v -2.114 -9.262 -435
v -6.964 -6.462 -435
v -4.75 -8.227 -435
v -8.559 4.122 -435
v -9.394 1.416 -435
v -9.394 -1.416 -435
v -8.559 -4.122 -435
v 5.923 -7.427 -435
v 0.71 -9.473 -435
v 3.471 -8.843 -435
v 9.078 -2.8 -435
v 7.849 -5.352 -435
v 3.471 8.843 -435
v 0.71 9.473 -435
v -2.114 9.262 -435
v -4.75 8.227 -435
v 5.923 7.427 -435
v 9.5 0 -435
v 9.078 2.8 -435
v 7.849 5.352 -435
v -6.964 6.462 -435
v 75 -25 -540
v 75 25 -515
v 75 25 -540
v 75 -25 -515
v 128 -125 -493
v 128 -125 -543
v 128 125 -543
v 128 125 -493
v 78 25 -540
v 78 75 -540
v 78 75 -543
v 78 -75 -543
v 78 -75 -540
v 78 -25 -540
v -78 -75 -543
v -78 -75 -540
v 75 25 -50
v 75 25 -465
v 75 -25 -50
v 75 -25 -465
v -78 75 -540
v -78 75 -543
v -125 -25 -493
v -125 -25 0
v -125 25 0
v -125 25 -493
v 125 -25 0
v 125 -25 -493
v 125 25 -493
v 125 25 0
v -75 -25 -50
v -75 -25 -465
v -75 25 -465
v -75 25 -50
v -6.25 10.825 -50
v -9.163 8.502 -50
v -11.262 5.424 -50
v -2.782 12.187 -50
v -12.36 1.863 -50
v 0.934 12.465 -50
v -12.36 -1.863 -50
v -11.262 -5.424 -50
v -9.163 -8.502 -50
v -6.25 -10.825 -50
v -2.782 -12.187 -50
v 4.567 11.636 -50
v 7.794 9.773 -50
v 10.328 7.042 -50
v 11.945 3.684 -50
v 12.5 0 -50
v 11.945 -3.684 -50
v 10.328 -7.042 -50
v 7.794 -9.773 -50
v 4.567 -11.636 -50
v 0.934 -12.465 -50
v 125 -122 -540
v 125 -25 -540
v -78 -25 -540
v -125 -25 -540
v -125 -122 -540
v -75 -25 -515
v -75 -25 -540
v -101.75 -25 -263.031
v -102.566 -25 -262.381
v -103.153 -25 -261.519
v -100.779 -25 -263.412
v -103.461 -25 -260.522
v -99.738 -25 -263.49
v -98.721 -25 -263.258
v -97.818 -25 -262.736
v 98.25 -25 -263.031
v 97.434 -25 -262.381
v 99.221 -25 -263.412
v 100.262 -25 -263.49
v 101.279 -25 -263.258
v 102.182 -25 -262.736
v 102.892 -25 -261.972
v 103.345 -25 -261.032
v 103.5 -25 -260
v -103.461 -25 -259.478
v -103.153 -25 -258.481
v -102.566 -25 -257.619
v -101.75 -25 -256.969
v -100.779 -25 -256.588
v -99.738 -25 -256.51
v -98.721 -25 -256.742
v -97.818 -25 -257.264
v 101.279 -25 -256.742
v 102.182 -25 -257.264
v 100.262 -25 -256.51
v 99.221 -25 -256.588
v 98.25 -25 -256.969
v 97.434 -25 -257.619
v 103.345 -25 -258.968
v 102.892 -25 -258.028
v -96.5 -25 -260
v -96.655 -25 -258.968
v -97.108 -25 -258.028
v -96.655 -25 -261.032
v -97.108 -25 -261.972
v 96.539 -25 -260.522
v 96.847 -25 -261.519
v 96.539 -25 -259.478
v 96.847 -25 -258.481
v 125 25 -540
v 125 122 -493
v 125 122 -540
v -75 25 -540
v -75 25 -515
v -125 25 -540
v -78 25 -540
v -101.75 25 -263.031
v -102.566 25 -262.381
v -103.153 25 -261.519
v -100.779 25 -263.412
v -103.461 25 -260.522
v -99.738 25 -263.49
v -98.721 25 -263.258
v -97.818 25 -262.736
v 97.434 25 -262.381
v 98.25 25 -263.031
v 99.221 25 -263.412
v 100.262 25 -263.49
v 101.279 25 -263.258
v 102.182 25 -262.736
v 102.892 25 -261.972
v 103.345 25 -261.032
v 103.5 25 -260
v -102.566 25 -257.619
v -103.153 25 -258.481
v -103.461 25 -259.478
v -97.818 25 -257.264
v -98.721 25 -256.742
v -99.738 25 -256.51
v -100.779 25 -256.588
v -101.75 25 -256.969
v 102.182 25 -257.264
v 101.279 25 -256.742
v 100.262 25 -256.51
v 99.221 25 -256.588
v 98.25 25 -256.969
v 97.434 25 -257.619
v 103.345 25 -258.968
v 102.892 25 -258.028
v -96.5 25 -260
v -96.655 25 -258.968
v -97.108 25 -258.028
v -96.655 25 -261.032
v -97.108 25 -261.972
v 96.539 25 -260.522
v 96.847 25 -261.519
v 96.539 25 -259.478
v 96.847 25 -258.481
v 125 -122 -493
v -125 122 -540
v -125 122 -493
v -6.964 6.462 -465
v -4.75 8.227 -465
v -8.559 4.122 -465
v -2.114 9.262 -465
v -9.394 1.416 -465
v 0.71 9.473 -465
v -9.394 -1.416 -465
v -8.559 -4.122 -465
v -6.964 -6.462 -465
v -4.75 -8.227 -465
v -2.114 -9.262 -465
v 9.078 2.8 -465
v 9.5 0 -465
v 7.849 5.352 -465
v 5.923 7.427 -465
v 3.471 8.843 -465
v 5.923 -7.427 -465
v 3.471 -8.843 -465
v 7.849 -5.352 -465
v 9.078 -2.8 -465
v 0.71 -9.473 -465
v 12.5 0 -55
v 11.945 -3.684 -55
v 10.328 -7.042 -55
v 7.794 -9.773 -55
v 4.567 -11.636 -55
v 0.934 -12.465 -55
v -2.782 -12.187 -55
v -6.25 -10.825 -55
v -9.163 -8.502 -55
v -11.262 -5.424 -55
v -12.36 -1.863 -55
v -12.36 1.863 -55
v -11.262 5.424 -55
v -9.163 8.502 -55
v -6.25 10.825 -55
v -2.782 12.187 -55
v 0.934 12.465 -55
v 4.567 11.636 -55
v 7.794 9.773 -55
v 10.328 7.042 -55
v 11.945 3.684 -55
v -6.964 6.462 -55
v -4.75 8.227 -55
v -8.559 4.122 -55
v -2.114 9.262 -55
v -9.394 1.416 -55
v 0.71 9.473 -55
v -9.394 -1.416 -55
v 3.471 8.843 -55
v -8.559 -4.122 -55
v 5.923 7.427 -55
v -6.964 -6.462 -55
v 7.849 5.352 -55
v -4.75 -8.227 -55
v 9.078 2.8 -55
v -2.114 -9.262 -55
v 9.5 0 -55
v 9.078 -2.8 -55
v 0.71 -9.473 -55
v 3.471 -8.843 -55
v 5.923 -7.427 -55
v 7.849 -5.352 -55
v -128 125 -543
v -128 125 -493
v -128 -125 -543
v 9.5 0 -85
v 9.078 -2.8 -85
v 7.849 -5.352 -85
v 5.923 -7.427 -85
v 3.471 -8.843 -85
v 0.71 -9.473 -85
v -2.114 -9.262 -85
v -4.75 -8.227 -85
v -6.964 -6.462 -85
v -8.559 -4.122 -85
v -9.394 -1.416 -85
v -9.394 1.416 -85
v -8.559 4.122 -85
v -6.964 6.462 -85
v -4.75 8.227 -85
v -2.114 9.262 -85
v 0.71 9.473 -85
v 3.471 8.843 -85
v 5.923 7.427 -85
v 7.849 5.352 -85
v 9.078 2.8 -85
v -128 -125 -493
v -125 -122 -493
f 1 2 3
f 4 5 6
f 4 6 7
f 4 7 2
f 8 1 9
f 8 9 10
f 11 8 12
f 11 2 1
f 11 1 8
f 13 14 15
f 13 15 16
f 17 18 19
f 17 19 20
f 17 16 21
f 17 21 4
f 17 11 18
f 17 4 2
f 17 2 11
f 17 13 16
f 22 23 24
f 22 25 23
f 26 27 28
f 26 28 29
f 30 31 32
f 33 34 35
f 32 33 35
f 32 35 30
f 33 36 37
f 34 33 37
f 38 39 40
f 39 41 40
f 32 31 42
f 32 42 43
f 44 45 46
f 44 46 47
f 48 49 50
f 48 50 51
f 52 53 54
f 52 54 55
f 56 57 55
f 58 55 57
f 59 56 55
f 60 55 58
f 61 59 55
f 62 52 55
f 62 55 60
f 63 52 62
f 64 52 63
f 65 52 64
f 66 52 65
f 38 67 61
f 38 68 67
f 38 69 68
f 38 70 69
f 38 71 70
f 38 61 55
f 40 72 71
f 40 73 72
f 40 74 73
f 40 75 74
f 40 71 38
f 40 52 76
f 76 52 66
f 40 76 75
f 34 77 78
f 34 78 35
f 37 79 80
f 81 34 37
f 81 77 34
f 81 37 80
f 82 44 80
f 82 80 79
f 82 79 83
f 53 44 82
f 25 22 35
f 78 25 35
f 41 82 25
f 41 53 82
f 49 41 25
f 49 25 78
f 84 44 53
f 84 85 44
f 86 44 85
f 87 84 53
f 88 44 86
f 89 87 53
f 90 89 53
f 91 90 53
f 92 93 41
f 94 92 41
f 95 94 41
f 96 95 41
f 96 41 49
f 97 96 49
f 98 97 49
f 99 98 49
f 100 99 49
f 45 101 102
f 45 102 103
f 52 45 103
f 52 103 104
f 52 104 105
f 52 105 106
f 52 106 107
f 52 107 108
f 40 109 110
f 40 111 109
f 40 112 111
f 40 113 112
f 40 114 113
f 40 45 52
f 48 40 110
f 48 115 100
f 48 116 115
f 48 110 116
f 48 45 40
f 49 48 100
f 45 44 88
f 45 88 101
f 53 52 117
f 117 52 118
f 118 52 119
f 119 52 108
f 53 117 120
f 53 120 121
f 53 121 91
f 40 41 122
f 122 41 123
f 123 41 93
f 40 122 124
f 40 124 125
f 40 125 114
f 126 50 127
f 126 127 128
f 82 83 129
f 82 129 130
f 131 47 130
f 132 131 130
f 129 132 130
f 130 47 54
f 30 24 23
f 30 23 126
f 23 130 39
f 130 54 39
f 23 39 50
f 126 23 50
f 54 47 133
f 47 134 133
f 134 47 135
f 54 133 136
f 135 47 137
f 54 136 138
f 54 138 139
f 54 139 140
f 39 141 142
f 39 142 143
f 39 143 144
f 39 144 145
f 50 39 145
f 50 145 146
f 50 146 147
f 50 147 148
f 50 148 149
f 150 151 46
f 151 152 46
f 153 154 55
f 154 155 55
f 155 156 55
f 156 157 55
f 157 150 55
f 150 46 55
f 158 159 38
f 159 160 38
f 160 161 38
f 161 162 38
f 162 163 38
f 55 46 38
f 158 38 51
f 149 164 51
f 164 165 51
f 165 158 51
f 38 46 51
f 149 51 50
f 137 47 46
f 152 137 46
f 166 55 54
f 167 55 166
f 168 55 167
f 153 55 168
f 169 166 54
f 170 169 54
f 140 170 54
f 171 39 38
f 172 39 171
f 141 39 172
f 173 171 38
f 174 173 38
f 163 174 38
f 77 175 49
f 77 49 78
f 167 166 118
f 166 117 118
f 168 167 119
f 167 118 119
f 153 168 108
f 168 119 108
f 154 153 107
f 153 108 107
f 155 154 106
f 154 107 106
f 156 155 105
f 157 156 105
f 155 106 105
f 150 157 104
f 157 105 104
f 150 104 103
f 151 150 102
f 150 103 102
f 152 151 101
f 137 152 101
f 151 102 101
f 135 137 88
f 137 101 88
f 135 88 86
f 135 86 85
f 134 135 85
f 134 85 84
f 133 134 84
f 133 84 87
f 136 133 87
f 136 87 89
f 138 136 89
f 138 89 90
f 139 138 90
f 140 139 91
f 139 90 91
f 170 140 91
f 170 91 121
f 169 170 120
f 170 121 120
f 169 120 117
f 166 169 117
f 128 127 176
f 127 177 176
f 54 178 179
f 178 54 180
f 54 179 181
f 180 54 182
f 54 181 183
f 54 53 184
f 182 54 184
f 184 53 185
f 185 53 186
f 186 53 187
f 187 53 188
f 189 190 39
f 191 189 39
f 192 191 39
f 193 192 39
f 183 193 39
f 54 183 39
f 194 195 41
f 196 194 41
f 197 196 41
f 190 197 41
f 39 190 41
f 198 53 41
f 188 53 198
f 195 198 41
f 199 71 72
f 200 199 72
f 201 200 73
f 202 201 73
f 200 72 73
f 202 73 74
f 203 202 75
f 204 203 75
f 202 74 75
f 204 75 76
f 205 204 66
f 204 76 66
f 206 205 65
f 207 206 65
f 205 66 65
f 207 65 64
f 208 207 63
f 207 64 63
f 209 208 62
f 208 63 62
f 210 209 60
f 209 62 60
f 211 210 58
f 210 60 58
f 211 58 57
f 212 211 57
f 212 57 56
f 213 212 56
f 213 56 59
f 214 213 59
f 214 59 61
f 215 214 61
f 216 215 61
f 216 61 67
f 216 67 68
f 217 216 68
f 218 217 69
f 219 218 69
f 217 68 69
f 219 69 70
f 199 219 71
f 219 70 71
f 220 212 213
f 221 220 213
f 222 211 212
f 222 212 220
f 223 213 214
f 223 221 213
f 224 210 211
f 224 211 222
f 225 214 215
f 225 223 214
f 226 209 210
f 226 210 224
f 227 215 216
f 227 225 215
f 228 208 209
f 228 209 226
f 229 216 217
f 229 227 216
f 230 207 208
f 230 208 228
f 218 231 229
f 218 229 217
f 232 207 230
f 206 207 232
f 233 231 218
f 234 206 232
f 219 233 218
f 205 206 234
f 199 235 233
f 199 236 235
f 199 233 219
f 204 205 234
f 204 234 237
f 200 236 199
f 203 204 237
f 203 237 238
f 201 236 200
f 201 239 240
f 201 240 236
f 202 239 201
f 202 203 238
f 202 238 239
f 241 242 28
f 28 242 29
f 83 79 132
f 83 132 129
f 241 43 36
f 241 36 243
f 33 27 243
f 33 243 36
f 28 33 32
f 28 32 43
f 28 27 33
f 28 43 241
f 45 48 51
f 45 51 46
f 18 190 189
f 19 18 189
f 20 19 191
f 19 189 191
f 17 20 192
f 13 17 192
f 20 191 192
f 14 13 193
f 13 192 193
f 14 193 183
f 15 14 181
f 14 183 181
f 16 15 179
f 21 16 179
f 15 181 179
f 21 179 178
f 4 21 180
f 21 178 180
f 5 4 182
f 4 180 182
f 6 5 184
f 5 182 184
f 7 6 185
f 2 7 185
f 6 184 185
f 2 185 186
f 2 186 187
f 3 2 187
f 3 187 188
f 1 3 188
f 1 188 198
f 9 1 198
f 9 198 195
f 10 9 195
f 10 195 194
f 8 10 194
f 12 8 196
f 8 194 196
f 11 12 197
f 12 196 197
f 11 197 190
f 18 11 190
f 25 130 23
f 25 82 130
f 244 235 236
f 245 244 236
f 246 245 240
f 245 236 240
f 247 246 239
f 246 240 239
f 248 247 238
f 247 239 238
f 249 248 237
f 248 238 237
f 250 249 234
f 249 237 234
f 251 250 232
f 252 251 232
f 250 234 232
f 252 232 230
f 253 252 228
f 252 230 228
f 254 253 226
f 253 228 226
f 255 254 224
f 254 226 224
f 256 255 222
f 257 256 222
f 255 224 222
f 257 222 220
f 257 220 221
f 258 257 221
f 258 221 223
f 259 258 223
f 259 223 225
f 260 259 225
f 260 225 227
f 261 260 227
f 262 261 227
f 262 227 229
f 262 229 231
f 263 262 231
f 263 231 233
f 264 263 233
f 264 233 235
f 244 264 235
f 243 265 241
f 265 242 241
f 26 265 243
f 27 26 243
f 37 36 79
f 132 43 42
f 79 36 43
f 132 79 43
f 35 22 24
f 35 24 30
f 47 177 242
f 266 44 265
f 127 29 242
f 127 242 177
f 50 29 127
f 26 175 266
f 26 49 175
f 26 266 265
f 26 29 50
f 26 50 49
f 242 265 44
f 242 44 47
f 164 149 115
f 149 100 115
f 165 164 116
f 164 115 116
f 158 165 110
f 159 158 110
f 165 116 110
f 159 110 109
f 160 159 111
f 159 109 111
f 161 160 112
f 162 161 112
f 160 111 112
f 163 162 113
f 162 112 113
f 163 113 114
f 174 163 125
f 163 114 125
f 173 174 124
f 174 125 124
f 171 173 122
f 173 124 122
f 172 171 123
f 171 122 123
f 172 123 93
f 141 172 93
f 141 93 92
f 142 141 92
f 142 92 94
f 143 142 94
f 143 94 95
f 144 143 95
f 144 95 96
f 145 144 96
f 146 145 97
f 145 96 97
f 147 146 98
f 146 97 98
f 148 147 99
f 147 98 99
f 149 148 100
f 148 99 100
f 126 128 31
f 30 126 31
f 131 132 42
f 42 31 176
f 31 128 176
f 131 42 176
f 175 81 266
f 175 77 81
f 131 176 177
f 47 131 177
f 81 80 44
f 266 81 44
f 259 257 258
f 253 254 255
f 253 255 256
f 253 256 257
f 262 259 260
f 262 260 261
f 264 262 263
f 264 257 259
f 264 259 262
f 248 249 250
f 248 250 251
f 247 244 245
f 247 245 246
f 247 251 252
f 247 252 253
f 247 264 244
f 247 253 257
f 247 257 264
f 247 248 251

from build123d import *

# Parameters (mm, degrees)
F0_W      = 150
F0_H      = 415
F1_DEPTH  = 25
F3_DEPTH  = 125
F5_DEPTH  = 125
F6_R      = 9.5
F7_DEPTH  = 35
F8_R      = 12.5
F9_DEPTH  = 5
F10_R     = 9.5
F11_DEPTH = 30
F12_R     = 3.5
F13_DEPTH = 30


with BuildPart() as f1:
    # F0 (on Front) → F1 (new body, symmetric)
    with BuildSketch(Plane.XZ):
        Polygon((125, -540), (125, 0), (-125, 0), (-125, -540), (-75, -540), (-75, -515), (75, -515), (75, -540), align=None)
        with Locations((0, -257.5)):
            Rectangle(F0_W, F0_H, mode=Mode.SUBTRACT)
    extrude(amount=F1_DEPTH, both=True)

    # F2 (on Front) → F3 (join, symmetric)
    with BuildSketch(Plane.XZ):
        Polygon((-125, -493), (-128, -493), (-128, -543), (-78, -543), (-78, -540), (-125, -540), align=None)
        Polygon((78, -540), (78, -543), (128, -543), (128, -493), (125, -493), (125, -540), align=None)
    extrude(amount=F3_DEPTH, both=True)

    # F4 (on Right) → F5 (join, symmetric)
    with BuildSketch(Plane.YZ):
        Polygon((125, -543), (125, -493), (122, -493), (122, -540), (75, -540), (75, -543), align=None)
        Polygon((-122, -540), (-122, -493), (-125, -493), (-125, -543), (-75, -543), (-75, -540), align=None)
    extrude(amount=F5_DEPTH, both=True)

    # F6 (on face) → F7 (join)
    with BuildSketch(Plane(origin=(0, 0, -50), x_dir=(1, 0, 0), z_dir=(0, 0, -1))):
        Circle(F6_R)
    extrude(amount=F7_DEPTH)

    # F8 (on face) → F9 (join)
    with BuildSketch(Plane(origin=(0, 0, -50), x_dir=(1, 0, 0), z_dir=(0, 0, -1))):
        Circle(F8_R)
    extrude(amount=F9_DEPTH)

    # F10 (on face) → F11 (join)
    with BuildSketch(Plane.XY.offset(-465)):
        Circle(F10_R)
    extrude(amount=F11_DEPTH)

    # F12 (on Front) → F13 (cut, symmetric)
    with BuildSketch(Plane.XZ):
        with Locations((-100, -260)):
            Circle(F12_R)
        with Locations((100, -260)):
            Circle(F12_R)
    extrude(amount=F13_DEPTH, both=True, mode=Mode.SUBTRACT)


solid = f1.part
